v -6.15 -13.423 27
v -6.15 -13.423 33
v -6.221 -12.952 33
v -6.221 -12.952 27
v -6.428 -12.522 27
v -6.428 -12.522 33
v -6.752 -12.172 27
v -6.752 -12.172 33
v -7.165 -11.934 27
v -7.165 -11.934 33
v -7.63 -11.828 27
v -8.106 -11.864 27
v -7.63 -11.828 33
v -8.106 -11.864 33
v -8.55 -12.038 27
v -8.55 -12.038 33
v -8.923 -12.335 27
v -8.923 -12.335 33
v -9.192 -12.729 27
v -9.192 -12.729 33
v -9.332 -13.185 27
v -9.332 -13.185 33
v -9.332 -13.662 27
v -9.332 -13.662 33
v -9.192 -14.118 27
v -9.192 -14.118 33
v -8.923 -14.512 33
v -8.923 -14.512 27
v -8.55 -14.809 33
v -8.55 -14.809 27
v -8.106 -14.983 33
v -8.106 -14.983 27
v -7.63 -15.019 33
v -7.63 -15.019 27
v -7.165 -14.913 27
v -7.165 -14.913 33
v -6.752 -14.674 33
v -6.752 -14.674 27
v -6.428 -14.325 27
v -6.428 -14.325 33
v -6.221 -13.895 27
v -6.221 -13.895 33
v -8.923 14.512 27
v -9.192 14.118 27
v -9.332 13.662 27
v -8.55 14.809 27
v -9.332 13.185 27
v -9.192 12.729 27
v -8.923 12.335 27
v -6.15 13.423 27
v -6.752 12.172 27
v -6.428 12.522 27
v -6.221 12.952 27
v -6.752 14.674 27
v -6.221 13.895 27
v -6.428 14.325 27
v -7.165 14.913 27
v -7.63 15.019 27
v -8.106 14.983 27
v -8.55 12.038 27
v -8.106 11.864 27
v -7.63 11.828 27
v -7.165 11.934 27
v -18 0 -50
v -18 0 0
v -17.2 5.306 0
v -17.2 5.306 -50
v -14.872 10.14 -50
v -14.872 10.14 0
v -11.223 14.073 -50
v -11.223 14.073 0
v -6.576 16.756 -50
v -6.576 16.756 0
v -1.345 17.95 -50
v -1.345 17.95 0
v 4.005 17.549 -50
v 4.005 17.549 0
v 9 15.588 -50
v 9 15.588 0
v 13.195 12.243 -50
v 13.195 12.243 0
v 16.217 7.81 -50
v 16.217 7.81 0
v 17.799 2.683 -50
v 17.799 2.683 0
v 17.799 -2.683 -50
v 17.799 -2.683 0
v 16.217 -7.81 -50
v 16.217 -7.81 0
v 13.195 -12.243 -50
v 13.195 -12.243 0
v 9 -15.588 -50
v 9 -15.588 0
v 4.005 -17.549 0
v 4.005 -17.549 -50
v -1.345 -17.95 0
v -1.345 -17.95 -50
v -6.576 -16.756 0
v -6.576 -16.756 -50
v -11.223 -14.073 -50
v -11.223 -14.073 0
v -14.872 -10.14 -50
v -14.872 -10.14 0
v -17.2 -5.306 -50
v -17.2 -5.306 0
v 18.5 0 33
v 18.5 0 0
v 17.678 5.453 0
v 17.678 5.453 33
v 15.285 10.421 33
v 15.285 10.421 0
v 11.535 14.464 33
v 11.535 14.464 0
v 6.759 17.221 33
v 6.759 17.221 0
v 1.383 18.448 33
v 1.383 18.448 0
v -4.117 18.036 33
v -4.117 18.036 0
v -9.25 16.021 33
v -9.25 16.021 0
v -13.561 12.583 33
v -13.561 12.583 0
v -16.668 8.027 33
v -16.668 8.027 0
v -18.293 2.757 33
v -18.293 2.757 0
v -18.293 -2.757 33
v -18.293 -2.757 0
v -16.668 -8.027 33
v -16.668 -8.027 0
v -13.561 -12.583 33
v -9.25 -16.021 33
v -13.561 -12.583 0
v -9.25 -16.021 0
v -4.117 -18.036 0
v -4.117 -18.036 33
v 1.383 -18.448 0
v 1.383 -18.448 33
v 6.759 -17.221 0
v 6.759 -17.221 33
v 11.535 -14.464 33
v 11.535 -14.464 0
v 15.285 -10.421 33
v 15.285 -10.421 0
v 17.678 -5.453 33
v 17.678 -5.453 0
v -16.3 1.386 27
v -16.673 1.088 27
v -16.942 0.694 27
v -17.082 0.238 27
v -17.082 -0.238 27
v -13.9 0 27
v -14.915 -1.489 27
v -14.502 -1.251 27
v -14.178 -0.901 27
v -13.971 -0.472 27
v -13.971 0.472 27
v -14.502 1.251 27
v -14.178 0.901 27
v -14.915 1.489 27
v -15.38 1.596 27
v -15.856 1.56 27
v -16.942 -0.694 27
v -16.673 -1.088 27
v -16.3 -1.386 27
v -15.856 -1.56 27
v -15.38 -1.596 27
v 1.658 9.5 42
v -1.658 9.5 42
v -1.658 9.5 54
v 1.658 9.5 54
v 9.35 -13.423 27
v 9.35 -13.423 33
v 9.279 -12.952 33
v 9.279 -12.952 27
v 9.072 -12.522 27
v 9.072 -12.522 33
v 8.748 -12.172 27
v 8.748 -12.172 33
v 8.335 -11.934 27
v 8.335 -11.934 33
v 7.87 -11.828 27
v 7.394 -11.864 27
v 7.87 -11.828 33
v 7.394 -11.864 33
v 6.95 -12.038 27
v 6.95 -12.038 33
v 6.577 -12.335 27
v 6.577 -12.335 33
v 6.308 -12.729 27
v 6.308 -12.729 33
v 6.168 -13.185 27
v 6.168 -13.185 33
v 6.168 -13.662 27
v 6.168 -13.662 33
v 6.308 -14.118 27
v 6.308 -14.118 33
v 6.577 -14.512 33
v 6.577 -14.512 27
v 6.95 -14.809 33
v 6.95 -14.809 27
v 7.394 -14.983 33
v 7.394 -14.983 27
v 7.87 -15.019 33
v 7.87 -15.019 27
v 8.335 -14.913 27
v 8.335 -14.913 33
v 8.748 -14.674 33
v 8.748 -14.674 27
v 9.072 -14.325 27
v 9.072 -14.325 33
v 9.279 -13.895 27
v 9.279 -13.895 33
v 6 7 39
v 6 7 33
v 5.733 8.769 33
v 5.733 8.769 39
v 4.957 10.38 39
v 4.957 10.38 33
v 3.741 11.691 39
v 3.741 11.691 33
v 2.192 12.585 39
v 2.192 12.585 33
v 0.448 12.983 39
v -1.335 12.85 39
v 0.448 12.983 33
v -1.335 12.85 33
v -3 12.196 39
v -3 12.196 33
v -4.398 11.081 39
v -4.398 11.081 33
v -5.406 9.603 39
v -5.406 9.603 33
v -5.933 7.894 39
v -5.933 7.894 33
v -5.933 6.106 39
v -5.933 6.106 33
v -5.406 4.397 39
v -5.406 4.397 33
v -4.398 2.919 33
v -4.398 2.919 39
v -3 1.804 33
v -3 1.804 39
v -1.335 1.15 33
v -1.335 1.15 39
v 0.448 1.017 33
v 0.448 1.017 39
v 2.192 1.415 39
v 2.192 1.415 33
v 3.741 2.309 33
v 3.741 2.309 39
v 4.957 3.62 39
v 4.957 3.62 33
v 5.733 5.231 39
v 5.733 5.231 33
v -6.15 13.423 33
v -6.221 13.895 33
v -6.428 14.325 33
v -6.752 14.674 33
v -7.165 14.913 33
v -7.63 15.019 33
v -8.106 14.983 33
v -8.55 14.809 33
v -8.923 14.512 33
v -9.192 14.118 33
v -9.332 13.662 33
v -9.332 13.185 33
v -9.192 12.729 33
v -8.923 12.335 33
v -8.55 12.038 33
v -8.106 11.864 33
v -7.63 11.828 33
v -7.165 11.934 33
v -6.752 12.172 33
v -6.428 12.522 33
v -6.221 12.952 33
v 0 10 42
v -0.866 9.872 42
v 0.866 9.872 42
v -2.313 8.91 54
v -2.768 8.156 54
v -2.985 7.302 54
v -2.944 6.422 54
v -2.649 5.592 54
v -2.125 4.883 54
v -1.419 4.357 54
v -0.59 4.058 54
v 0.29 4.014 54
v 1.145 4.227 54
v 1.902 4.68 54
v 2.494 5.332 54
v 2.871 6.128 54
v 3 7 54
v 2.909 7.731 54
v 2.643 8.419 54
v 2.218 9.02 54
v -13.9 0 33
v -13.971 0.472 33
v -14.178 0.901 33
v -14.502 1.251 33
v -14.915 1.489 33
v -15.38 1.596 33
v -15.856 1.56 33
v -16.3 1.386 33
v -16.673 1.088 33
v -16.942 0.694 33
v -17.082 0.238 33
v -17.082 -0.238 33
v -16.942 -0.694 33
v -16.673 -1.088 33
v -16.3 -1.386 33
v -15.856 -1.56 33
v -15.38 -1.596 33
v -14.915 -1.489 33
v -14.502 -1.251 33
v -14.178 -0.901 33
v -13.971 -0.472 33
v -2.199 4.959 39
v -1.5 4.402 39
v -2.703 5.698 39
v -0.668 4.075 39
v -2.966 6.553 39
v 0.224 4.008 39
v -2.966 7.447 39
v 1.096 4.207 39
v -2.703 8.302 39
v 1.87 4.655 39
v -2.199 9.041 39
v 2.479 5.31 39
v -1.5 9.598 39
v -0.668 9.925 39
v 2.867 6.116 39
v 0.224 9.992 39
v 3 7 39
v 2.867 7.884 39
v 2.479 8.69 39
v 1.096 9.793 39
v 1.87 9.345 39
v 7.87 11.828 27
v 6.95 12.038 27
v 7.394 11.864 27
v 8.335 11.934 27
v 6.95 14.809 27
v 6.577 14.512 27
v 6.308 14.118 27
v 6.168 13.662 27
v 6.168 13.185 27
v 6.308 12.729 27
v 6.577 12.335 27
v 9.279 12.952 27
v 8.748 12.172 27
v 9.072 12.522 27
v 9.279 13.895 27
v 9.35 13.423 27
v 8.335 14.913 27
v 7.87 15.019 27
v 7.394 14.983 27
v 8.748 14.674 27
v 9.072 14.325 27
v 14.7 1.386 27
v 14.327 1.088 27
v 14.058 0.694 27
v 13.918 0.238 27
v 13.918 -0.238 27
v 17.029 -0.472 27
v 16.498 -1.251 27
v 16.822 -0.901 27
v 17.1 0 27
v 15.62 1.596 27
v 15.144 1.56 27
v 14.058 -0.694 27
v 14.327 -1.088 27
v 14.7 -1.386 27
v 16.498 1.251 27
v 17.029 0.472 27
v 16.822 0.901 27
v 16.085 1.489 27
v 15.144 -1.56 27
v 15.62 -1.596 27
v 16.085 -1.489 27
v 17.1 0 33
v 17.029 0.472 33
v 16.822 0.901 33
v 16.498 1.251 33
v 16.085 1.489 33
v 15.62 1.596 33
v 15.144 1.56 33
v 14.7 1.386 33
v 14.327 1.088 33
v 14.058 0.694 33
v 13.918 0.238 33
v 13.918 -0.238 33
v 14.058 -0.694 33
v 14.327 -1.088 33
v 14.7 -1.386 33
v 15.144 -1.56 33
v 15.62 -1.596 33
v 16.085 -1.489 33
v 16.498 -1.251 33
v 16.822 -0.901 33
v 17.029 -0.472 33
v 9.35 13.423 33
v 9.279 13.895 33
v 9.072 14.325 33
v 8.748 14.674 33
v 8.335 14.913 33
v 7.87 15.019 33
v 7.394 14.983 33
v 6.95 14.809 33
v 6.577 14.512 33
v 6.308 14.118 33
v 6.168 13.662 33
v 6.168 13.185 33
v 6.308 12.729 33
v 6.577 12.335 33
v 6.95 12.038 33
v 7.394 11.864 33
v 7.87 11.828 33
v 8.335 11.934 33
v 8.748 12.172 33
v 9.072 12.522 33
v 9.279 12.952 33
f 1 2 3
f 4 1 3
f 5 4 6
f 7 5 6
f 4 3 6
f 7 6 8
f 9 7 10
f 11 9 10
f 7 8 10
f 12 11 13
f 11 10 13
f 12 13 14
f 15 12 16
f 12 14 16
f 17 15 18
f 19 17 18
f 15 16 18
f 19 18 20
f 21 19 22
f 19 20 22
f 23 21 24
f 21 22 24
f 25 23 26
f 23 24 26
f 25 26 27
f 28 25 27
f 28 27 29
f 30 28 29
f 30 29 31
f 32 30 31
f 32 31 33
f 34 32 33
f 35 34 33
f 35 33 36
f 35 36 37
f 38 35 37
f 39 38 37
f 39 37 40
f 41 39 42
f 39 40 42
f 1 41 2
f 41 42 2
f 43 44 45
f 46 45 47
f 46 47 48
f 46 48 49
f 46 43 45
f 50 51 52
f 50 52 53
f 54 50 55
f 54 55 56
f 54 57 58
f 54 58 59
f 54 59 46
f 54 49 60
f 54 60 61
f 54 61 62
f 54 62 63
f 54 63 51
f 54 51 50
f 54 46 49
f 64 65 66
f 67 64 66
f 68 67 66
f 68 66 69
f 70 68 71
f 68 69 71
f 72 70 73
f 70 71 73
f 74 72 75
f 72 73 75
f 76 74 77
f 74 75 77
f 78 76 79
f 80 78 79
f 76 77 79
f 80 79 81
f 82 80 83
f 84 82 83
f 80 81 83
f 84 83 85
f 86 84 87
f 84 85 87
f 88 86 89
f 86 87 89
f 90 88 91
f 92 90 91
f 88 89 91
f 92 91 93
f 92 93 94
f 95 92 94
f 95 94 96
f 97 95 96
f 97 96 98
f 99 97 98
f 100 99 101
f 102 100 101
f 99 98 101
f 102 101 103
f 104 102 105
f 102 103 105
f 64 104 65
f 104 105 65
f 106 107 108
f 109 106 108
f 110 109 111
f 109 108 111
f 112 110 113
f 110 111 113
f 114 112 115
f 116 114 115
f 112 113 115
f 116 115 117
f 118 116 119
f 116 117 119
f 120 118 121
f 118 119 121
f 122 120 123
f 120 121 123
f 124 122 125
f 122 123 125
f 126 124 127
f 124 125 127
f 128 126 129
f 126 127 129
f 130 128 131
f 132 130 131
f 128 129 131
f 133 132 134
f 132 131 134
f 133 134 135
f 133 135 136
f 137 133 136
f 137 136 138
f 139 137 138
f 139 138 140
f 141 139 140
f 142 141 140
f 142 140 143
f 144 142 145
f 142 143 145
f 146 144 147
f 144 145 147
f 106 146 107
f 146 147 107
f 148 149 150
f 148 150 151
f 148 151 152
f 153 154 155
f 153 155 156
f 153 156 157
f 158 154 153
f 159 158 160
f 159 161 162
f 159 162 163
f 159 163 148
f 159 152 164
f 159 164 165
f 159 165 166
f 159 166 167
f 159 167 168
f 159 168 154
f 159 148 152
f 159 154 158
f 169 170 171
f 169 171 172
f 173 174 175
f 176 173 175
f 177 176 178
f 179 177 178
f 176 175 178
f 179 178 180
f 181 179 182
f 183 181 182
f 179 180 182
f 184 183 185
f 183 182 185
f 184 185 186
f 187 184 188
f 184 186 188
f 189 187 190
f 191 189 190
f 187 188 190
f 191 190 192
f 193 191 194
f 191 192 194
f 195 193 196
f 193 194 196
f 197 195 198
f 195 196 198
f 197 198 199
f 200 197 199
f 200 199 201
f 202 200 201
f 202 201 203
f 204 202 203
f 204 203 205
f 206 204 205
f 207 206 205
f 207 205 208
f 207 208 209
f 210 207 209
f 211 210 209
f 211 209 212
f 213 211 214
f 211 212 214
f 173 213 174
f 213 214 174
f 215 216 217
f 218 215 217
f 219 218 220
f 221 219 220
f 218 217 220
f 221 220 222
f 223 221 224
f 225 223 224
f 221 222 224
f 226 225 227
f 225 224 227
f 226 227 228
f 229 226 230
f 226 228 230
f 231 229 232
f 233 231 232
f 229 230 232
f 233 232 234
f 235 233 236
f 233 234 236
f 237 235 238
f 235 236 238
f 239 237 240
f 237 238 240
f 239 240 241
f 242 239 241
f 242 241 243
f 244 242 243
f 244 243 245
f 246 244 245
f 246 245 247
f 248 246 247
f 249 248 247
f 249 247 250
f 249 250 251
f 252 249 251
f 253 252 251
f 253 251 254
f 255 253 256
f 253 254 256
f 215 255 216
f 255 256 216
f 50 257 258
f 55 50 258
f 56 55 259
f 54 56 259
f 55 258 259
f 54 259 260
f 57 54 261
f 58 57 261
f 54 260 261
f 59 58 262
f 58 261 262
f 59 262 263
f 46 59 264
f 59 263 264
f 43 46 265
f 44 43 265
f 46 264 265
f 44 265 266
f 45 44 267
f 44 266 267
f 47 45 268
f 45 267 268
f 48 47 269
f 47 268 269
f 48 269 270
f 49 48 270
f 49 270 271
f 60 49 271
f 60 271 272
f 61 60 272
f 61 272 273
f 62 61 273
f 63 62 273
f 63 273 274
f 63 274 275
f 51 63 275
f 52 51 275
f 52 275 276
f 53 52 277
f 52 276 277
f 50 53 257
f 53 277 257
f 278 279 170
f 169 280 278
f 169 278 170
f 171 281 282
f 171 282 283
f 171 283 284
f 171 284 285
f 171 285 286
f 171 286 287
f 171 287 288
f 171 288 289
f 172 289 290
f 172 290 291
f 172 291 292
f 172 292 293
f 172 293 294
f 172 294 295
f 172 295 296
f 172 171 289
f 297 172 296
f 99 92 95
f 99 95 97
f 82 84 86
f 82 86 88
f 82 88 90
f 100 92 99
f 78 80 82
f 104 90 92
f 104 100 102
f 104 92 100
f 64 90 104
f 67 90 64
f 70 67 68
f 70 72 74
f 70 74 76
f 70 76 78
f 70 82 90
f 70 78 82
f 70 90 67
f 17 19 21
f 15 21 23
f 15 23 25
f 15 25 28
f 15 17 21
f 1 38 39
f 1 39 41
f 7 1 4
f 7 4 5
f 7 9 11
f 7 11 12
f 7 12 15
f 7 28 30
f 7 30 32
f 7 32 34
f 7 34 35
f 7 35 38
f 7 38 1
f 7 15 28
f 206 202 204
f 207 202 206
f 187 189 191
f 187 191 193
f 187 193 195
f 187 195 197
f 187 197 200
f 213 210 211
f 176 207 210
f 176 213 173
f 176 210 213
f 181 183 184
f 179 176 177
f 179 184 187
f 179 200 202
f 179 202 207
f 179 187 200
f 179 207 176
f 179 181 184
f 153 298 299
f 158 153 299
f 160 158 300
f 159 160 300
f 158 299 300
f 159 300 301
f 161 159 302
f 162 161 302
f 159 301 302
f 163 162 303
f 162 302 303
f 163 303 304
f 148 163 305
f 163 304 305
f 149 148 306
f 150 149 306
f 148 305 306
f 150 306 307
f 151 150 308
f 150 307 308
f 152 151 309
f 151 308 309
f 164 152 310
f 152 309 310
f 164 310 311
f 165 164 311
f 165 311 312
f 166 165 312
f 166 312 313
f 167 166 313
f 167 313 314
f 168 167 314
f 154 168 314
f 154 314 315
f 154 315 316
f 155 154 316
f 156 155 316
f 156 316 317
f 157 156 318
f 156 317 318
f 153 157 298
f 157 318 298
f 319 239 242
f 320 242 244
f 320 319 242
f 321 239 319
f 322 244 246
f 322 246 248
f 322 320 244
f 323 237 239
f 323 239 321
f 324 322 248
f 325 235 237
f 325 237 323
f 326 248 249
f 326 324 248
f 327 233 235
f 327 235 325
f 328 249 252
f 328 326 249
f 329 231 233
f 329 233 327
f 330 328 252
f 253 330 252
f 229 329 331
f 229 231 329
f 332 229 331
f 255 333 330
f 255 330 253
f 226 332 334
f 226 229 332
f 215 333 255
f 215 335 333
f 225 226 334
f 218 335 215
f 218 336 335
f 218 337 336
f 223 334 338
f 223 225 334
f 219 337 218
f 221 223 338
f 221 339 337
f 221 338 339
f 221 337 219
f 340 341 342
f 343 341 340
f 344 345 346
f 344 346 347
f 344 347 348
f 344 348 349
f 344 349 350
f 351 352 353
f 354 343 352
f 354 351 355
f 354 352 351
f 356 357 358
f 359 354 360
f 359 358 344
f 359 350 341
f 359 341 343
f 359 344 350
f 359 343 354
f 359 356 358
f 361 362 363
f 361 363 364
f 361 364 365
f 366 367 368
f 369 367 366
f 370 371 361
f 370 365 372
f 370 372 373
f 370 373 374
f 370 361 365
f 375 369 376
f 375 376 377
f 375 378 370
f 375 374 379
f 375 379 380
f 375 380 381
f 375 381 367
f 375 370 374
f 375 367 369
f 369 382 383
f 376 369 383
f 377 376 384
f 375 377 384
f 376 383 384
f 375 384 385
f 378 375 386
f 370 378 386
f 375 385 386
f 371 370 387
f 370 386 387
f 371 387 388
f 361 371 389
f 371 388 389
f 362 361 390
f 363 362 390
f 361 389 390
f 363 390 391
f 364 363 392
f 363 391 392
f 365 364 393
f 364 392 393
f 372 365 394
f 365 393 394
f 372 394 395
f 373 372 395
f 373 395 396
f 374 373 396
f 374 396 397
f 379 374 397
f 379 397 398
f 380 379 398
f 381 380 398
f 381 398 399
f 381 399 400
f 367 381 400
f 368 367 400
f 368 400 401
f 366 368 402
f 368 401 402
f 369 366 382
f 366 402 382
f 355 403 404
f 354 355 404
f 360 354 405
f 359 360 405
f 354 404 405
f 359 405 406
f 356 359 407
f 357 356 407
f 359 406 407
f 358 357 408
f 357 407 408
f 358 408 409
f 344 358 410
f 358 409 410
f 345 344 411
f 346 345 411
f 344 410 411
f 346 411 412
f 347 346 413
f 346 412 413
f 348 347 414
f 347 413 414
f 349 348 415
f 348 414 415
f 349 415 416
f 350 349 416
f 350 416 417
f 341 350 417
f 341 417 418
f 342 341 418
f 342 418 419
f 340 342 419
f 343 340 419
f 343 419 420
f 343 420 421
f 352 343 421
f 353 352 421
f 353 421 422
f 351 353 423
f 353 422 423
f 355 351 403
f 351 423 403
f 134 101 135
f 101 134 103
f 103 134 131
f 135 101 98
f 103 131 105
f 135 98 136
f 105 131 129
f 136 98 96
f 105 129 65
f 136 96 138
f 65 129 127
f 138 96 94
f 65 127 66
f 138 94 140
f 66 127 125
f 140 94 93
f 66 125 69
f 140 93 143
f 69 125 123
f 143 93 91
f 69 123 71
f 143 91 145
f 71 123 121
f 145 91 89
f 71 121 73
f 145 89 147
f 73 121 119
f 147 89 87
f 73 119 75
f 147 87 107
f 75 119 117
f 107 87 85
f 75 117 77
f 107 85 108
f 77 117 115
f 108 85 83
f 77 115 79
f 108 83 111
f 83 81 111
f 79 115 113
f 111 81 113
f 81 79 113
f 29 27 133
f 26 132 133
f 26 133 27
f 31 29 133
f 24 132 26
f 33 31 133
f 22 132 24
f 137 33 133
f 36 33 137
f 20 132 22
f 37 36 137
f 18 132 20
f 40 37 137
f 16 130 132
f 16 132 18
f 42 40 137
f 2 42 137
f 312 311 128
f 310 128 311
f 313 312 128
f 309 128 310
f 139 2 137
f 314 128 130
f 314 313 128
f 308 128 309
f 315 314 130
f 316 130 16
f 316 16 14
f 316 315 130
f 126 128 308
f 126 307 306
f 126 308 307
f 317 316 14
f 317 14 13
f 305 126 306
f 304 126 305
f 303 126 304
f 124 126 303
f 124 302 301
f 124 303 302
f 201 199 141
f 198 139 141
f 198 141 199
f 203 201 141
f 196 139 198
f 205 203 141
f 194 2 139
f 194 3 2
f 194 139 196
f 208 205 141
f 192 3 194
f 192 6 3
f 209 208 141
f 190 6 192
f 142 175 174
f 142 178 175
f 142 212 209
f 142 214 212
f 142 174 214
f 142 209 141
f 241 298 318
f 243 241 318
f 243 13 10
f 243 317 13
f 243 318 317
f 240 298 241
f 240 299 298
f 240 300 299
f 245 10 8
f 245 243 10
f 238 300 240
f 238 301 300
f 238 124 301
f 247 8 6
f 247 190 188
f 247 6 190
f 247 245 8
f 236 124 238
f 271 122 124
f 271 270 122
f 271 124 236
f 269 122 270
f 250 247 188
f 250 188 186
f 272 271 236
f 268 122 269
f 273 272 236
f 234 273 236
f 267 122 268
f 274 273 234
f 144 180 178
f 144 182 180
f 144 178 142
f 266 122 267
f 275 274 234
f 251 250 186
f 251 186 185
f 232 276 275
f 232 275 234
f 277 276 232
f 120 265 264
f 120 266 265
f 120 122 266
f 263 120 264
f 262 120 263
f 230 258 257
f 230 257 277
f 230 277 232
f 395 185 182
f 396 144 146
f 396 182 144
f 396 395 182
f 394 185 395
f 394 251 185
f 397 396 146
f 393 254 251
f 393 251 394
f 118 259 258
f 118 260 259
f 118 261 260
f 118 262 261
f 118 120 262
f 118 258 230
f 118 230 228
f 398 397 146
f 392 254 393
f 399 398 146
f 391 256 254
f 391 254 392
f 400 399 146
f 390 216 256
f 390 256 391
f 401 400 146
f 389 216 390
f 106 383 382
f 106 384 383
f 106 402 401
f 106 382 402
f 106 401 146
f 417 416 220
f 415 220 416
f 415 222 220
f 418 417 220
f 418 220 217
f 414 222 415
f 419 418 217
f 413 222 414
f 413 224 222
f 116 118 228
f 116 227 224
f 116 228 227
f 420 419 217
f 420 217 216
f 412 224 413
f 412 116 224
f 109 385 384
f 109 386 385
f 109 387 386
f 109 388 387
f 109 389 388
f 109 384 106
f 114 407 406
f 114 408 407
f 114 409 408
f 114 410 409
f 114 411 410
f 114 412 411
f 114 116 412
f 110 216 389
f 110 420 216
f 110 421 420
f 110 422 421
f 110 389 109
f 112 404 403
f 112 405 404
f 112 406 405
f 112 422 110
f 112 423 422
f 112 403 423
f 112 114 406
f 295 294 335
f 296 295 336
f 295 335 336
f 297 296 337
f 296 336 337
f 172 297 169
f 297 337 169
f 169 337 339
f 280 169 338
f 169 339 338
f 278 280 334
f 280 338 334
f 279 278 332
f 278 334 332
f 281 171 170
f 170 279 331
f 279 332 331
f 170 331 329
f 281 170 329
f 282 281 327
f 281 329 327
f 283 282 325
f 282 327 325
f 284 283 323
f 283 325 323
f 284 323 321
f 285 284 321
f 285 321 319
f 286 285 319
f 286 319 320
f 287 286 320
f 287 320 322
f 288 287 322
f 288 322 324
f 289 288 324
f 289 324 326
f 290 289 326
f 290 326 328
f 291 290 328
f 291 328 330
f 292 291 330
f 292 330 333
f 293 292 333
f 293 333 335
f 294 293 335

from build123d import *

# Parameters (mm, degrees)
SKETCH_1_R          = 18.5
EXTRUDE_1_DEPTH     = 33
SKETCH_2_R          = 18
EXTRUDE_2_DEPTH     = 50
SKETCH_3_R          = 1.6
CUT_EXTRUDE_1_DEPTH = 6
SKETCH_4_R          = 6
EXTRUDE_3_DEPTH     = 6
SKETCH_5_R          = 3
EXTRUDE_4_DEPTH     = 15
CUT_EXTRUDE_START   = -12
CUT_EXTRUDE_2_DEPTH = 12


with BuildPart() as part:
    # 草图1 → 凸台-拉伸1 (new body)
    with BuildSketch(Plane.XY):
        Circle(SKETCH_1_R)
    extrude(amount=EXTRUDE_1_DEPTH)

    # 草图2 → 凸台-拉伸2 (add)
    with BuildSketch(Plane(origin=(0, 0, 0), x_dir=(-1, 0, 0), z_dir=(0, 0, -1))):
        Circle(SKETCH_2_R)
    extrude(amount=EXTRUDE_2_DEPTH)

    # 草图3 → 切除-拉伸1 (cut)
    with BuildSketch(Plane.XY.offset(33)):
        with Locations((-15.5, 0)):
            Circle(SKETCH_3_R)
        with Locations((-7.75, 13.423393759)):
            Circle(SKETCH_3_R)
        with Locations((7.75, 13.423393759)):
            Circle(SKETCH_3_R)
        with Locations((15.5, 0)):
            Circle(SKETCH_3_R)
        with Locations((7.75, -13.423393759)):
            Circle(SKETCH_3_R)
        with Locations((-7.75, -13.423393759)):
            Circle(SKETCH_3_R)
    extrude(amount=-CUT_EXTRUDE_1_DEPTH, mode=Mode.SUBTRACT)

    # 草图4 → 凸台-拉伸3 (add)
    with BuildSketch(Plane.XY.offset(33)):
        with Locations((0, 7)):
            Circle(SKETCH_4_R)
    extrude(amount=EXTRUDE_3_DEPTH)

    # 草图5 → 凸台-拉伸4 (add)
    with BuildSketch(Plane.XY.offset(39)):
        with Locations((0, 7)):
            Circle(SKETCH_5_R)
    extrude(amount=EXTRUDE_4_DEPTH)

    # 草图6 → 切除-拉伸2 (cut)
    with BuildSketch(Plane.XY.offset(54).offset(CUT_EXTRUDE_START)):
        with BuildLine():
            Line((-1.658312395, 9.5), (1.658312395, 9.5))
            ThreePointArc((1.658312395, 9.5), (0, 10), (-1.658312395, 9.5))
        make_face()
    extrude(amount=CUT_EXTRUDE_2_DEPTH, mode=Mode.SUBTRACT)


solid = part.part
